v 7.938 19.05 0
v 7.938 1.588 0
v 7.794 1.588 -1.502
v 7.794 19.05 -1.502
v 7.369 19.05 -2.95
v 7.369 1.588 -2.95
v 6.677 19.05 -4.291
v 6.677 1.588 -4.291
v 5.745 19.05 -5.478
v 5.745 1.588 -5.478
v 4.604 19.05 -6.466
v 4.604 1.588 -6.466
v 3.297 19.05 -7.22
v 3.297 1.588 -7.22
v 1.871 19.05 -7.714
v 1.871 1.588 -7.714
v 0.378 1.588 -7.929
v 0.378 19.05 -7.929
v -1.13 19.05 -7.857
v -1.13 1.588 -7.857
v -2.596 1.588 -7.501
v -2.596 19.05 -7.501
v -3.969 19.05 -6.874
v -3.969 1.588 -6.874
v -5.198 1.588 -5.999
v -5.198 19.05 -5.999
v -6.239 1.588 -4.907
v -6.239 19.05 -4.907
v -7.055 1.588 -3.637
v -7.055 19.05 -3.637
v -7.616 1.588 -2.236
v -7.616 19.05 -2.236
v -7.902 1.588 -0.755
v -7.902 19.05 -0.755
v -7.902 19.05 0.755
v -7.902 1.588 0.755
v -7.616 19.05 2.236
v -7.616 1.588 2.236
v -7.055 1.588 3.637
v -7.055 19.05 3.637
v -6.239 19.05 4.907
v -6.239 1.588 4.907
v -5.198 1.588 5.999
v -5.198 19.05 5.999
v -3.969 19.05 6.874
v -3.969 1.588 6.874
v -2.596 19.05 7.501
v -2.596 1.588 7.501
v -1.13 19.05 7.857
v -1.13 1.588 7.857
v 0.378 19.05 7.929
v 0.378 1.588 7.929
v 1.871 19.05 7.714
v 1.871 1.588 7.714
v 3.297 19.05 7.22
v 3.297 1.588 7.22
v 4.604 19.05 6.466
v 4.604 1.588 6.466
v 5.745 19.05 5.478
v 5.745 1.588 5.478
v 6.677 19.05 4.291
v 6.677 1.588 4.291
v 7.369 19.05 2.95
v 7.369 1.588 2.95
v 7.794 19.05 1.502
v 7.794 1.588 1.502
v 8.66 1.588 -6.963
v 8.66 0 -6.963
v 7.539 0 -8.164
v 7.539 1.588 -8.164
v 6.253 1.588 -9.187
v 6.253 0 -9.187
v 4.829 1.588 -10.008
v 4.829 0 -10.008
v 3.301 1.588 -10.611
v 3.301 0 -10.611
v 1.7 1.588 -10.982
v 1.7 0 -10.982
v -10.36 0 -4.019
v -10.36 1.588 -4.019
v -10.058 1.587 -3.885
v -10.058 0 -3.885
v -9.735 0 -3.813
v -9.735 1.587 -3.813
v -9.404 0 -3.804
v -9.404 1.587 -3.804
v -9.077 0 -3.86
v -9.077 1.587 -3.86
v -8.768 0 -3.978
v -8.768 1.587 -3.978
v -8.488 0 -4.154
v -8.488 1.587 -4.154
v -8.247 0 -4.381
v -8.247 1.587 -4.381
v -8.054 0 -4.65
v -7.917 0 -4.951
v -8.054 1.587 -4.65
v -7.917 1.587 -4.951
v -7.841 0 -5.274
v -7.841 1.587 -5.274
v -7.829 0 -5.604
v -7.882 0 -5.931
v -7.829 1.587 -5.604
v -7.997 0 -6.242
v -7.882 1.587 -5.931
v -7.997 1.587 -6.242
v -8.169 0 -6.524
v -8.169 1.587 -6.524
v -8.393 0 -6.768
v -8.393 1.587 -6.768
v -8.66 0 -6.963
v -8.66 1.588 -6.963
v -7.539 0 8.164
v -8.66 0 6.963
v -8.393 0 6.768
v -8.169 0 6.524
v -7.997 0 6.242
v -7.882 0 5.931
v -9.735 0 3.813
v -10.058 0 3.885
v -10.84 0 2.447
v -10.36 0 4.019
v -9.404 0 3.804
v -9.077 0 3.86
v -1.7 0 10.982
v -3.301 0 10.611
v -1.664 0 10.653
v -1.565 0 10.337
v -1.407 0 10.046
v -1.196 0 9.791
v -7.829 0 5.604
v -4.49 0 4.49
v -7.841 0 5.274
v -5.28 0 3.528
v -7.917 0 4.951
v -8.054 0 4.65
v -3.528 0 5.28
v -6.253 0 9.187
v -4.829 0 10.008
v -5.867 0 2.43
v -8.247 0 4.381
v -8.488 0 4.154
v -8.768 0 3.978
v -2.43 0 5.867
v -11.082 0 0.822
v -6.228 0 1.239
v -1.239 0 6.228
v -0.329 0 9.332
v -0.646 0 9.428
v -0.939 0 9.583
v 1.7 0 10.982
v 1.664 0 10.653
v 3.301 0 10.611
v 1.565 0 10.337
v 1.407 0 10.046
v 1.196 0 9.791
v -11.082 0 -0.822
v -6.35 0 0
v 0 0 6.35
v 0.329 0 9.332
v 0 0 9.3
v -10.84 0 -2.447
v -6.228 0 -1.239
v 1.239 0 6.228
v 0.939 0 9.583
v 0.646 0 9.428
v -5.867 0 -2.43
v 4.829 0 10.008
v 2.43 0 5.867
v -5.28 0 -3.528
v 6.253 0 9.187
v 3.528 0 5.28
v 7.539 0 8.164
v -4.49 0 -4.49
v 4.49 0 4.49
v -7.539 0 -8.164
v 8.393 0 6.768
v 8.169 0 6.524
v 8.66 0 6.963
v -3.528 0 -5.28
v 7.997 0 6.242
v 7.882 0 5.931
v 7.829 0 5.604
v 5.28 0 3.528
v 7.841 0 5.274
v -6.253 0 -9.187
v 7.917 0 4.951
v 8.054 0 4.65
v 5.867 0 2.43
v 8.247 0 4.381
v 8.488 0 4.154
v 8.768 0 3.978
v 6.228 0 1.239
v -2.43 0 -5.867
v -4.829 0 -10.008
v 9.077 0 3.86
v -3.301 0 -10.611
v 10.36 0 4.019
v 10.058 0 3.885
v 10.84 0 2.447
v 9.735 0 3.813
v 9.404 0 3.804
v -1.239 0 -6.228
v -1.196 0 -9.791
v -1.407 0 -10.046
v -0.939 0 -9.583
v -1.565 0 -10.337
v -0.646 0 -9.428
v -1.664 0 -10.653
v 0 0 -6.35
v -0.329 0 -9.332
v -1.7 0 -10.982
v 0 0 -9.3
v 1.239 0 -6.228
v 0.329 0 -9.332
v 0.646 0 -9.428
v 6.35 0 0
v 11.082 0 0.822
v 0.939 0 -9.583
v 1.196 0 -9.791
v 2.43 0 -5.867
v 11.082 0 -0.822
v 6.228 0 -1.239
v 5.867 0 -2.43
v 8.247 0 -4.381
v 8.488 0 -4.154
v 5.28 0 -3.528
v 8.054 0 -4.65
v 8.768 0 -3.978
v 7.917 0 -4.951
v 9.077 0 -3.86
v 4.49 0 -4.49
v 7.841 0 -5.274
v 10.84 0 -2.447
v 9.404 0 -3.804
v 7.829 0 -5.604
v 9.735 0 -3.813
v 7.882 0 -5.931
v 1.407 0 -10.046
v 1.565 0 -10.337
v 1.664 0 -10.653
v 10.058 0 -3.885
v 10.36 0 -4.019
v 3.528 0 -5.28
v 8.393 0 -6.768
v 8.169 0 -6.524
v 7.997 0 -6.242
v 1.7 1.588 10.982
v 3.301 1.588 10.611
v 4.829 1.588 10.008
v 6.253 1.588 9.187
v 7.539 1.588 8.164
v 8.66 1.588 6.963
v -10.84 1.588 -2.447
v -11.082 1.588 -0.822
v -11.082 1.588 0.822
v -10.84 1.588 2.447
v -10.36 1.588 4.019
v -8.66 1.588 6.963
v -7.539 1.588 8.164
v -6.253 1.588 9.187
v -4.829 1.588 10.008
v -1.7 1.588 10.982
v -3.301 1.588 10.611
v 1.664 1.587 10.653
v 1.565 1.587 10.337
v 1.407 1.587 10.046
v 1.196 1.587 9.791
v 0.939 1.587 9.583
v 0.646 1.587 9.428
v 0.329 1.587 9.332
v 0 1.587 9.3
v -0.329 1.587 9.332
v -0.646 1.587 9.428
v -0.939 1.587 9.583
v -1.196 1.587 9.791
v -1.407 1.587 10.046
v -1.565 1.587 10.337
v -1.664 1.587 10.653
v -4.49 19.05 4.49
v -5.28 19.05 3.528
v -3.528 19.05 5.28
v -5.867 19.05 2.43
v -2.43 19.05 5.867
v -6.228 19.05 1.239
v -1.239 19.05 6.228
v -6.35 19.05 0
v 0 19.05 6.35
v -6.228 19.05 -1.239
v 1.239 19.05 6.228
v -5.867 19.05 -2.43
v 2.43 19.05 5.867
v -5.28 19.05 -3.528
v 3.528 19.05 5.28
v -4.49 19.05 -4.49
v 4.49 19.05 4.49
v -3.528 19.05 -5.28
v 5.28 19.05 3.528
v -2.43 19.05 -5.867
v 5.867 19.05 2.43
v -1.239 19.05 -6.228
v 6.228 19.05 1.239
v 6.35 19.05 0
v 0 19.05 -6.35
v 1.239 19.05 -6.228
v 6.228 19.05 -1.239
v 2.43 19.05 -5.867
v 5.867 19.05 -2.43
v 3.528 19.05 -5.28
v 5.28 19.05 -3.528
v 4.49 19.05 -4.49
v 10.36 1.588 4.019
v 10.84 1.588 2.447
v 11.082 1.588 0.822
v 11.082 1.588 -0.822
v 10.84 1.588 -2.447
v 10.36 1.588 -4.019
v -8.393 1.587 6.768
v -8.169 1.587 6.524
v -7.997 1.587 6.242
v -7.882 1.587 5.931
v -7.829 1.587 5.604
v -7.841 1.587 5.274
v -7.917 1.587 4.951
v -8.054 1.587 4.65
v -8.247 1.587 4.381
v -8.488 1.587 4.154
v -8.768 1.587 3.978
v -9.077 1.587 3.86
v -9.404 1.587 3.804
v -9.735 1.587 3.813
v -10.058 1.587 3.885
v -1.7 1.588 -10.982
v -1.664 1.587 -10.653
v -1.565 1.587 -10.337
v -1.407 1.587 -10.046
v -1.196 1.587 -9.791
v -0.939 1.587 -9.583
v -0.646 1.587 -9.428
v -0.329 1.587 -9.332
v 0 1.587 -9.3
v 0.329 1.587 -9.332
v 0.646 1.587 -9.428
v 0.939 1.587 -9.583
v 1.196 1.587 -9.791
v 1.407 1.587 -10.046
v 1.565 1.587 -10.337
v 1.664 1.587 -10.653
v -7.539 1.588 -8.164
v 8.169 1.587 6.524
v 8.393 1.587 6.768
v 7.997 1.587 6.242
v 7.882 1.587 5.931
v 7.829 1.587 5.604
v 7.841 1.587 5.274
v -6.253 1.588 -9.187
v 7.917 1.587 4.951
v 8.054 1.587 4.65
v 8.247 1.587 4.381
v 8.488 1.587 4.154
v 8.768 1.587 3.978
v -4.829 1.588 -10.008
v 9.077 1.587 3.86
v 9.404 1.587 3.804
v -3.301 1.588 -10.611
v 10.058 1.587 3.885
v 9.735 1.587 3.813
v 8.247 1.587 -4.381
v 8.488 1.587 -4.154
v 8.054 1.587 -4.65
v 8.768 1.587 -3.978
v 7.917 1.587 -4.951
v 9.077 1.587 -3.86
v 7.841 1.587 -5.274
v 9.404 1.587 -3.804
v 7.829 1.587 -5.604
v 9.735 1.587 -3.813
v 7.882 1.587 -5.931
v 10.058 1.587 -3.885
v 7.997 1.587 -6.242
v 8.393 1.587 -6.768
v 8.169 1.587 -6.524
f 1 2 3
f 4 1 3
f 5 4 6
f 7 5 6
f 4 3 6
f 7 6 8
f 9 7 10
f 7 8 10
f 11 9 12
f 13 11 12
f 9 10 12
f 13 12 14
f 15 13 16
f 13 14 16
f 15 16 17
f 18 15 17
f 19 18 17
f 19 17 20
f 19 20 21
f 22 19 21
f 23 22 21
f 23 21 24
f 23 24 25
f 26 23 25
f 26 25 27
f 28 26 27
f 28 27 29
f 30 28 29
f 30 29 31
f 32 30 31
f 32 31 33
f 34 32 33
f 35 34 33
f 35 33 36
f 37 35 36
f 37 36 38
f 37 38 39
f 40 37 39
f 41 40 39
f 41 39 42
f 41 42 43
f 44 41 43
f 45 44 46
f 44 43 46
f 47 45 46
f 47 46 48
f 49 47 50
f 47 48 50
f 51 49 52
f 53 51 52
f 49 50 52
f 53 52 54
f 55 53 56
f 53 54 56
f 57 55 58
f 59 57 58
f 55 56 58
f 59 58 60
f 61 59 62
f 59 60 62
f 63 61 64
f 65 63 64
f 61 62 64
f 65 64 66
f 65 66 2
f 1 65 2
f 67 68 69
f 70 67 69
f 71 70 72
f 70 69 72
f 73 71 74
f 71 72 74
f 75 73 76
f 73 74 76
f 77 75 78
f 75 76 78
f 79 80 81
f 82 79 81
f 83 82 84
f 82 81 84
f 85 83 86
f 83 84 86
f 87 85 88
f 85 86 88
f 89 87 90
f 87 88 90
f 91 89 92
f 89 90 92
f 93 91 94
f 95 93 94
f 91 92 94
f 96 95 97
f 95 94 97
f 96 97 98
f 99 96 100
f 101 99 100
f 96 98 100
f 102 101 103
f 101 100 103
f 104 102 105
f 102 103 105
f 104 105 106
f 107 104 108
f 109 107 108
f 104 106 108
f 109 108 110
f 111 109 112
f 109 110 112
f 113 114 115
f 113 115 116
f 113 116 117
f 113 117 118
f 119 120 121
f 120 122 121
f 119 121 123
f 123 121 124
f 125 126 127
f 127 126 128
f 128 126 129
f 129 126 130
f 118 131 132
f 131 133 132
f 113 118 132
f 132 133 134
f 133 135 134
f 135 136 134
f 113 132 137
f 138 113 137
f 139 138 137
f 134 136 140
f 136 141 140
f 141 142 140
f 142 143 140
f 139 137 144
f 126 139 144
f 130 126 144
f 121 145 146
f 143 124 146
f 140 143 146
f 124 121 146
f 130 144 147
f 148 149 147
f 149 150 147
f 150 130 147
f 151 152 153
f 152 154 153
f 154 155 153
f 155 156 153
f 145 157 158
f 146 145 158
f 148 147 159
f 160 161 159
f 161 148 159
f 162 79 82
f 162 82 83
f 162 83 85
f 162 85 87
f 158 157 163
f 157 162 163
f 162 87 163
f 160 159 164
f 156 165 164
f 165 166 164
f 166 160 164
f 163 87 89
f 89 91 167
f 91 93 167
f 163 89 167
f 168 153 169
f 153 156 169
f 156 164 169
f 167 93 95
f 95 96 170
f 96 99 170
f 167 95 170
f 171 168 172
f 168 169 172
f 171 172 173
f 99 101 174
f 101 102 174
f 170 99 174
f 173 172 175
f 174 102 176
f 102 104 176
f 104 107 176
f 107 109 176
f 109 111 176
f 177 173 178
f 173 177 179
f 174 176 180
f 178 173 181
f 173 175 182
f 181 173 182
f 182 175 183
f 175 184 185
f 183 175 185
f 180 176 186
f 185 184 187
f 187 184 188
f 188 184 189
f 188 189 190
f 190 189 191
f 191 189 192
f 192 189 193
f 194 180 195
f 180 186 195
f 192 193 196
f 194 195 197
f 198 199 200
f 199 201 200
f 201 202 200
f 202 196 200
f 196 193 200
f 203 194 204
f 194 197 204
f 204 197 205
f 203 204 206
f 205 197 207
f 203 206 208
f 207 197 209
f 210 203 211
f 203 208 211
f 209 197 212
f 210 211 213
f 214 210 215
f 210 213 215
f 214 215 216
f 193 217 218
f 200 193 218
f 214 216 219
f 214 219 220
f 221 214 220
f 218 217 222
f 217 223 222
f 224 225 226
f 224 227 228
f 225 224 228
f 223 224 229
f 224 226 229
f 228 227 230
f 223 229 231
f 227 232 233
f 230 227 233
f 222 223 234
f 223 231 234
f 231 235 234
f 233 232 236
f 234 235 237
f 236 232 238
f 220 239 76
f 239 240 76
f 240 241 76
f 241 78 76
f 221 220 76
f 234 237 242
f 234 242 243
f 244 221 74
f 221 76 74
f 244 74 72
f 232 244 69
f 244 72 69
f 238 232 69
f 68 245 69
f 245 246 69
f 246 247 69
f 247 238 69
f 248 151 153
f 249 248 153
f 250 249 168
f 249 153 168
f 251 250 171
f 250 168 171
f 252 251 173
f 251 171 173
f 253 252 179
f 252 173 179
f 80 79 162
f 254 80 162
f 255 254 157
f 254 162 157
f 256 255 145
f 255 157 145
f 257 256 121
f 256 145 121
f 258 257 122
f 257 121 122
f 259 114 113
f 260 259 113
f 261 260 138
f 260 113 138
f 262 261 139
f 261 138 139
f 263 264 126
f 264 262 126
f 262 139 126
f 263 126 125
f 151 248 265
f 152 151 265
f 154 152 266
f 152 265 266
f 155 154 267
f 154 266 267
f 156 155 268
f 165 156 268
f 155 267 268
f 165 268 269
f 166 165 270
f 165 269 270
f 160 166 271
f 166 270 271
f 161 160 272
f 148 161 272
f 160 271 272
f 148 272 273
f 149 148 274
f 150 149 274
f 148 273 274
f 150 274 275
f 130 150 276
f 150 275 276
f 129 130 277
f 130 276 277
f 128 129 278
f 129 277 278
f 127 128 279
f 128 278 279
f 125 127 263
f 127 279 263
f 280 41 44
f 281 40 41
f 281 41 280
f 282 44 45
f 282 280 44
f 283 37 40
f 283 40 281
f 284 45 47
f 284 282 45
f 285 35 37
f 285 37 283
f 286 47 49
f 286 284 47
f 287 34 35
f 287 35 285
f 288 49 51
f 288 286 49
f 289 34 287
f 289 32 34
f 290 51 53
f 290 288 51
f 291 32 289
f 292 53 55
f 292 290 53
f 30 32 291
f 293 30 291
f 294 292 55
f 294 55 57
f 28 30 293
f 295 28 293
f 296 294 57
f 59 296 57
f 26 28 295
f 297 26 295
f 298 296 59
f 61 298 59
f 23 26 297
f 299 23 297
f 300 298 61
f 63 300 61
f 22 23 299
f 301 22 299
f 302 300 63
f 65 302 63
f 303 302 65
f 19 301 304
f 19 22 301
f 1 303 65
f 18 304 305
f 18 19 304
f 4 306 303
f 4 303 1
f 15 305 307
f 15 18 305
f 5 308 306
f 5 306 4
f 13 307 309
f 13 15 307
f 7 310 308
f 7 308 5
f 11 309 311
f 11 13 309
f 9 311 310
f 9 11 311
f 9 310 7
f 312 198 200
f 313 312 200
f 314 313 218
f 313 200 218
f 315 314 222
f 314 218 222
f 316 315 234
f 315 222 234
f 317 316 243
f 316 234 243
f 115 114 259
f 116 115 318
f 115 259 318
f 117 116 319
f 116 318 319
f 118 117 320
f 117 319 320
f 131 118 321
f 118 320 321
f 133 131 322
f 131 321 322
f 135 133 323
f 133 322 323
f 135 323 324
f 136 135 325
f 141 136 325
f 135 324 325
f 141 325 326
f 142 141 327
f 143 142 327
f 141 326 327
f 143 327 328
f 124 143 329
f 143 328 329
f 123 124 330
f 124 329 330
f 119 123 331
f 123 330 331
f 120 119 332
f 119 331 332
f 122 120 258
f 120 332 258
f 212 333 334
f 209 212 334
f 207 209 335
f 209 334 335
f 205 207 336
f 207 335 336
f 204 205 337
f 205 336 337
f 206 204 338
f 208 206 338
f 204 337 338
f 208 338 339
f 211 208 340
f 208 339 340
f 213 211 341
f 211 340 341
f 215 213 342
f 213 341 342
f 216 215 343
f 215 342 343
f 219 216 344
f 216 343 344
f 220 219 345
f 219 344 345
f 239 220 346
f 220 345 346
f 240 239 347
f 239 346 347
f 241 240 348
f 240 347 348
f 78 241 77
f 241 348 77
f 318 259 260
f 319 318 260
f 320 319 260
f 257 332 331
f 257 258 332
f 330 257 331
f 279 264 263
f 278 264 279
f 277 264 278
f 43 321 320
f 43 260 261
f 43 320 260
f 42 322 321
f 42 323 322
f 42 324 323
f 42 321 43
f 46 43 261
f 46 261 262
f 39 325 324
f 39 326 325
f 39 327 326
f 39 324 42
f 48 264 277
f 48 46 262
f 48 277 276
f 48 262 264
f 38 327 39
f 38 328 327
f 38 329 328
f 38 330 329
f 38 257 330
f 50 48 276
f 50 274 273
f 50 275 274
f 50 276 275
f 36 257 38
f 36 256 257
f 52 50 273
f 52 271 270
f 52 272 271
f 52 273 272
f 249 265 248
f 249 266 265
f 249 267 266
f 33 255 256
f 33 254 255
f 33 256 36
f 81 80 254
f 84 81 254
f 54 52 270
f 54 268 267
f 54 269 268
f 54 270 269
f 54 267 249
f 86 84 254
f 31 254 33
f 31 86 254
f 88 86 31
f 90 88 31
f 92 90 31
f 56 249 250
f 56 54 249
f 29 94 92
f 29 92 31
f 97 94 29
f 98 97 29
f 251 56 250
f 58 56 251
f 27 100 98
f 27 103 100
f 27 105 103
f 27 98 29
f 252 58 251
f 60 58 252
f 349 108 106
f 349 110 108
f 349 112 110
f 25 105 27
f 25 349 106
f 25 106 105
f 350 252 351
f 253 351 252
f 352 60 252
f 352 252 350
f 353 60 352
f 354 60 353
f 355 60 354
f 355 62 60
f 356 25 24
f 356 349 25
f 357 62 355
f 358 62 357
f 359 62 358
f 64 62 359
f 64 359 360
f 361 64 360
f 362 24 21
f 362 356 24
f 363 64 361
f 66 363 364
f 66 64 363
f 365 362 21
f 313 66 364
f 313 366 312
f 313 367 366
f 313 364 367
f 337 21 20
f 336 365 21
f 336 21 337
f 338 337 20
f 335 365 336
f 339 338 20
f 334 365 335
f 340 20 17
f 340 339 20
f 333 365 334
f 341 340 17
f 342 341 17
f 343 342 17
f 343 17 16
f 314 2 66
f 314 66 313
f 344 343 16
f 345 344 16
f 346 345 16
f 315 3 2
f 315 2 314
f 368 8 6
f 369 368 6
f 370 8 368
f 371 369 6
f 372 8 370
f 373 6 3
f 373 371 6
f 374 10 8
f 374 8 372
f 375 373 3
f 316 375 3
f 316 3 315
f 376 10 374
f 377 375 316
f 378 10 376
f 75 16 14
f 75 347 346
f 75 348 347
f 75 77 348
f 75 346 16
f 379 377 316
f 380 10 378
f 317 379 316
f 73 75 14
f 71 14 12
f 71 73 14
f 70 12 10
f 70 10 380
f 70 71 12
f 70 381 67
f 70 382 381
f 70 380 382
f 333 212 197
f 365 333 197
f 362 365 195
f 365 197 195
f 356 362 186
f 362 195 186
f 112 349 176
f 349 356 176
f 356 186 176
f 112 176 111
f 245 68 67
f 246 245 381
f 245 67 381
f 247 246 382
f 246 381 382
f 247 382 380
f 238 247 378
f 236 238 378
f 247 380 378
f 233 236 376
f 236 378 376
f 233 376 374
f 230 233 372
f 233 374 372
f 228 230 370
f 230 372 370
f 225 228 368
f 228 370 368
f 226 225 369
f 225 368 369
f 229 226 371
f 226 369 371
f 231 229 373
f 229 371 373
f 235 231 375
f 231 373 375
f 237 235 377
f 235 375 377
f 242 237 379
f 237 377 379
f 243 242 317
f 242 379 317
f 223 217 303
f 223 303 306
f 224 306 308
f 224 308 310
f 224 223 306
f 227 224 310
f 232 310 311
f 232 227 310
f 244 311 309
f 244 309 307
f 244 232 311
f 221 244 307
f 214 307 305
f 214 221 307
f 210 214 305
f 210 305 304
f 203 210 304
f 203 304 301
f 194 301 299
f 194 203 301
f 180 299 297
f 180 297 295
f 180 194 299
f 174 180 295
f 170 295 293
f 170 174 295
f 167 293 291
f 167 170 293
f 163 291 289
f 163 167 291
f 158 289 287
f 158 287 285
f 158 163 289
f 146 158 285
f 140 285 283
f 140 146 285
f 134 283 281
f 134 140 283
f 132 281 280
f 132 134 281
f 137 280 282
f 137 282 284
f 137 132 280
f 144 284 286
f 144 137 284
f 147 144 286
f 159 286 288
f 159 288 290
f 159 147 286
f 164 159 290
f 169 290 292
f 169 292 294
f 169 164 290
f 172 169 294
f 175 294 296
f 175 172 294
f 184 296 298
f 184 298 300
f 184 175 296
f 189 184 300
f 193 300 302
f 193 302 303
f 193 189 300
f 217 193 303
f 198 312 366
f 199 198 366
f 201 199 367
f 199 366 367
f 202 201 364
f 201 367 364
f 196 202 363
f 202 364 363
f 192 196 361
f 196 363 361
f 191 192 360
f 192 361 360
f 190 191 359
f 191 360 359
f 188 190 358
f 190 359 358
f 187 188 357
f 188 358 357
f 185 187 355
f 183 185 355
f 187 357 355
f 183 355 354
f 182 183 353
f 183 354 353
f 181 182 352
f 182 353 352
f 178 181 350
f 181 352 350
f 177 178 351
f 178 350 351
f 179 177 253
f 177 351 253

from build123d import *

# Parameters (mm, degrees)
SKETCH2_R            = 7.9375
SKETCH2_R_2          = 6.35
BOSS_EXTRUDE1_DEPTH  = 19.05
SKETCH3_R            = 11.1125
SKETCH3_R_2          = 7.9375
BOSS_EXTRUDE2_DEPTH  = 1.5875
M3_CLEARANCE_HOLE1_D = 3.4
CIRPATTERN1_COUNT    = 6


with BuildPart() as part:
    # Sketch2 → Boss-Extrude1 (new body)
    with BuildSketch(Plane(origin=(0, 0, 0), x_dir=(1, 0, 0), z_dir=(0, 1, 0))):
        Circle(SKETCH2_R)
        Circle(SKETCH2_R_2, mode=Mode.SUBTRACT)
    extrude(amount=BOSS_EXTRUDE1_DEPTH)

    # Sketch3 → Boss-Extrude2 (add)
    with BuildSketch(Plane(origin=(0, 0, 0), x_dir=(1, 0, 0), z_dir=(0, 1, 0))):
        Circle(SKETCH3_R)
        Circle(SKETCH3_R_2, mode=Mode.SUBTRACT)
    extrude(amount=BOSS_EXTRUDE2_DEPTH)

    # M3 Clearance Hole1 (through all)
    with Locations(Plane(origin=(0, 0, 0), x_dir=(-1, 0, 0), z_dir=(0, -1, 0))):
        with Locations((0, -11)):
            m3_clearance_hole1 = Hole(M3_CLEARANCE_HOLE1_D / 2)

    # CirPattern1: M3 Clearance Hole1 ×6 about axis
    cirpattern1_axis = Axis((0, 0, 0), (0, 1, 0))
    for i in range(1, CIRPATTERN1_COUNT):
        add(m3_clearance_hole1.rotate(cirpattern1_axis, i * 360 / CIRPATTERN1_COUNT), mode=Mode.SUBTRACT)


solid = part.part
